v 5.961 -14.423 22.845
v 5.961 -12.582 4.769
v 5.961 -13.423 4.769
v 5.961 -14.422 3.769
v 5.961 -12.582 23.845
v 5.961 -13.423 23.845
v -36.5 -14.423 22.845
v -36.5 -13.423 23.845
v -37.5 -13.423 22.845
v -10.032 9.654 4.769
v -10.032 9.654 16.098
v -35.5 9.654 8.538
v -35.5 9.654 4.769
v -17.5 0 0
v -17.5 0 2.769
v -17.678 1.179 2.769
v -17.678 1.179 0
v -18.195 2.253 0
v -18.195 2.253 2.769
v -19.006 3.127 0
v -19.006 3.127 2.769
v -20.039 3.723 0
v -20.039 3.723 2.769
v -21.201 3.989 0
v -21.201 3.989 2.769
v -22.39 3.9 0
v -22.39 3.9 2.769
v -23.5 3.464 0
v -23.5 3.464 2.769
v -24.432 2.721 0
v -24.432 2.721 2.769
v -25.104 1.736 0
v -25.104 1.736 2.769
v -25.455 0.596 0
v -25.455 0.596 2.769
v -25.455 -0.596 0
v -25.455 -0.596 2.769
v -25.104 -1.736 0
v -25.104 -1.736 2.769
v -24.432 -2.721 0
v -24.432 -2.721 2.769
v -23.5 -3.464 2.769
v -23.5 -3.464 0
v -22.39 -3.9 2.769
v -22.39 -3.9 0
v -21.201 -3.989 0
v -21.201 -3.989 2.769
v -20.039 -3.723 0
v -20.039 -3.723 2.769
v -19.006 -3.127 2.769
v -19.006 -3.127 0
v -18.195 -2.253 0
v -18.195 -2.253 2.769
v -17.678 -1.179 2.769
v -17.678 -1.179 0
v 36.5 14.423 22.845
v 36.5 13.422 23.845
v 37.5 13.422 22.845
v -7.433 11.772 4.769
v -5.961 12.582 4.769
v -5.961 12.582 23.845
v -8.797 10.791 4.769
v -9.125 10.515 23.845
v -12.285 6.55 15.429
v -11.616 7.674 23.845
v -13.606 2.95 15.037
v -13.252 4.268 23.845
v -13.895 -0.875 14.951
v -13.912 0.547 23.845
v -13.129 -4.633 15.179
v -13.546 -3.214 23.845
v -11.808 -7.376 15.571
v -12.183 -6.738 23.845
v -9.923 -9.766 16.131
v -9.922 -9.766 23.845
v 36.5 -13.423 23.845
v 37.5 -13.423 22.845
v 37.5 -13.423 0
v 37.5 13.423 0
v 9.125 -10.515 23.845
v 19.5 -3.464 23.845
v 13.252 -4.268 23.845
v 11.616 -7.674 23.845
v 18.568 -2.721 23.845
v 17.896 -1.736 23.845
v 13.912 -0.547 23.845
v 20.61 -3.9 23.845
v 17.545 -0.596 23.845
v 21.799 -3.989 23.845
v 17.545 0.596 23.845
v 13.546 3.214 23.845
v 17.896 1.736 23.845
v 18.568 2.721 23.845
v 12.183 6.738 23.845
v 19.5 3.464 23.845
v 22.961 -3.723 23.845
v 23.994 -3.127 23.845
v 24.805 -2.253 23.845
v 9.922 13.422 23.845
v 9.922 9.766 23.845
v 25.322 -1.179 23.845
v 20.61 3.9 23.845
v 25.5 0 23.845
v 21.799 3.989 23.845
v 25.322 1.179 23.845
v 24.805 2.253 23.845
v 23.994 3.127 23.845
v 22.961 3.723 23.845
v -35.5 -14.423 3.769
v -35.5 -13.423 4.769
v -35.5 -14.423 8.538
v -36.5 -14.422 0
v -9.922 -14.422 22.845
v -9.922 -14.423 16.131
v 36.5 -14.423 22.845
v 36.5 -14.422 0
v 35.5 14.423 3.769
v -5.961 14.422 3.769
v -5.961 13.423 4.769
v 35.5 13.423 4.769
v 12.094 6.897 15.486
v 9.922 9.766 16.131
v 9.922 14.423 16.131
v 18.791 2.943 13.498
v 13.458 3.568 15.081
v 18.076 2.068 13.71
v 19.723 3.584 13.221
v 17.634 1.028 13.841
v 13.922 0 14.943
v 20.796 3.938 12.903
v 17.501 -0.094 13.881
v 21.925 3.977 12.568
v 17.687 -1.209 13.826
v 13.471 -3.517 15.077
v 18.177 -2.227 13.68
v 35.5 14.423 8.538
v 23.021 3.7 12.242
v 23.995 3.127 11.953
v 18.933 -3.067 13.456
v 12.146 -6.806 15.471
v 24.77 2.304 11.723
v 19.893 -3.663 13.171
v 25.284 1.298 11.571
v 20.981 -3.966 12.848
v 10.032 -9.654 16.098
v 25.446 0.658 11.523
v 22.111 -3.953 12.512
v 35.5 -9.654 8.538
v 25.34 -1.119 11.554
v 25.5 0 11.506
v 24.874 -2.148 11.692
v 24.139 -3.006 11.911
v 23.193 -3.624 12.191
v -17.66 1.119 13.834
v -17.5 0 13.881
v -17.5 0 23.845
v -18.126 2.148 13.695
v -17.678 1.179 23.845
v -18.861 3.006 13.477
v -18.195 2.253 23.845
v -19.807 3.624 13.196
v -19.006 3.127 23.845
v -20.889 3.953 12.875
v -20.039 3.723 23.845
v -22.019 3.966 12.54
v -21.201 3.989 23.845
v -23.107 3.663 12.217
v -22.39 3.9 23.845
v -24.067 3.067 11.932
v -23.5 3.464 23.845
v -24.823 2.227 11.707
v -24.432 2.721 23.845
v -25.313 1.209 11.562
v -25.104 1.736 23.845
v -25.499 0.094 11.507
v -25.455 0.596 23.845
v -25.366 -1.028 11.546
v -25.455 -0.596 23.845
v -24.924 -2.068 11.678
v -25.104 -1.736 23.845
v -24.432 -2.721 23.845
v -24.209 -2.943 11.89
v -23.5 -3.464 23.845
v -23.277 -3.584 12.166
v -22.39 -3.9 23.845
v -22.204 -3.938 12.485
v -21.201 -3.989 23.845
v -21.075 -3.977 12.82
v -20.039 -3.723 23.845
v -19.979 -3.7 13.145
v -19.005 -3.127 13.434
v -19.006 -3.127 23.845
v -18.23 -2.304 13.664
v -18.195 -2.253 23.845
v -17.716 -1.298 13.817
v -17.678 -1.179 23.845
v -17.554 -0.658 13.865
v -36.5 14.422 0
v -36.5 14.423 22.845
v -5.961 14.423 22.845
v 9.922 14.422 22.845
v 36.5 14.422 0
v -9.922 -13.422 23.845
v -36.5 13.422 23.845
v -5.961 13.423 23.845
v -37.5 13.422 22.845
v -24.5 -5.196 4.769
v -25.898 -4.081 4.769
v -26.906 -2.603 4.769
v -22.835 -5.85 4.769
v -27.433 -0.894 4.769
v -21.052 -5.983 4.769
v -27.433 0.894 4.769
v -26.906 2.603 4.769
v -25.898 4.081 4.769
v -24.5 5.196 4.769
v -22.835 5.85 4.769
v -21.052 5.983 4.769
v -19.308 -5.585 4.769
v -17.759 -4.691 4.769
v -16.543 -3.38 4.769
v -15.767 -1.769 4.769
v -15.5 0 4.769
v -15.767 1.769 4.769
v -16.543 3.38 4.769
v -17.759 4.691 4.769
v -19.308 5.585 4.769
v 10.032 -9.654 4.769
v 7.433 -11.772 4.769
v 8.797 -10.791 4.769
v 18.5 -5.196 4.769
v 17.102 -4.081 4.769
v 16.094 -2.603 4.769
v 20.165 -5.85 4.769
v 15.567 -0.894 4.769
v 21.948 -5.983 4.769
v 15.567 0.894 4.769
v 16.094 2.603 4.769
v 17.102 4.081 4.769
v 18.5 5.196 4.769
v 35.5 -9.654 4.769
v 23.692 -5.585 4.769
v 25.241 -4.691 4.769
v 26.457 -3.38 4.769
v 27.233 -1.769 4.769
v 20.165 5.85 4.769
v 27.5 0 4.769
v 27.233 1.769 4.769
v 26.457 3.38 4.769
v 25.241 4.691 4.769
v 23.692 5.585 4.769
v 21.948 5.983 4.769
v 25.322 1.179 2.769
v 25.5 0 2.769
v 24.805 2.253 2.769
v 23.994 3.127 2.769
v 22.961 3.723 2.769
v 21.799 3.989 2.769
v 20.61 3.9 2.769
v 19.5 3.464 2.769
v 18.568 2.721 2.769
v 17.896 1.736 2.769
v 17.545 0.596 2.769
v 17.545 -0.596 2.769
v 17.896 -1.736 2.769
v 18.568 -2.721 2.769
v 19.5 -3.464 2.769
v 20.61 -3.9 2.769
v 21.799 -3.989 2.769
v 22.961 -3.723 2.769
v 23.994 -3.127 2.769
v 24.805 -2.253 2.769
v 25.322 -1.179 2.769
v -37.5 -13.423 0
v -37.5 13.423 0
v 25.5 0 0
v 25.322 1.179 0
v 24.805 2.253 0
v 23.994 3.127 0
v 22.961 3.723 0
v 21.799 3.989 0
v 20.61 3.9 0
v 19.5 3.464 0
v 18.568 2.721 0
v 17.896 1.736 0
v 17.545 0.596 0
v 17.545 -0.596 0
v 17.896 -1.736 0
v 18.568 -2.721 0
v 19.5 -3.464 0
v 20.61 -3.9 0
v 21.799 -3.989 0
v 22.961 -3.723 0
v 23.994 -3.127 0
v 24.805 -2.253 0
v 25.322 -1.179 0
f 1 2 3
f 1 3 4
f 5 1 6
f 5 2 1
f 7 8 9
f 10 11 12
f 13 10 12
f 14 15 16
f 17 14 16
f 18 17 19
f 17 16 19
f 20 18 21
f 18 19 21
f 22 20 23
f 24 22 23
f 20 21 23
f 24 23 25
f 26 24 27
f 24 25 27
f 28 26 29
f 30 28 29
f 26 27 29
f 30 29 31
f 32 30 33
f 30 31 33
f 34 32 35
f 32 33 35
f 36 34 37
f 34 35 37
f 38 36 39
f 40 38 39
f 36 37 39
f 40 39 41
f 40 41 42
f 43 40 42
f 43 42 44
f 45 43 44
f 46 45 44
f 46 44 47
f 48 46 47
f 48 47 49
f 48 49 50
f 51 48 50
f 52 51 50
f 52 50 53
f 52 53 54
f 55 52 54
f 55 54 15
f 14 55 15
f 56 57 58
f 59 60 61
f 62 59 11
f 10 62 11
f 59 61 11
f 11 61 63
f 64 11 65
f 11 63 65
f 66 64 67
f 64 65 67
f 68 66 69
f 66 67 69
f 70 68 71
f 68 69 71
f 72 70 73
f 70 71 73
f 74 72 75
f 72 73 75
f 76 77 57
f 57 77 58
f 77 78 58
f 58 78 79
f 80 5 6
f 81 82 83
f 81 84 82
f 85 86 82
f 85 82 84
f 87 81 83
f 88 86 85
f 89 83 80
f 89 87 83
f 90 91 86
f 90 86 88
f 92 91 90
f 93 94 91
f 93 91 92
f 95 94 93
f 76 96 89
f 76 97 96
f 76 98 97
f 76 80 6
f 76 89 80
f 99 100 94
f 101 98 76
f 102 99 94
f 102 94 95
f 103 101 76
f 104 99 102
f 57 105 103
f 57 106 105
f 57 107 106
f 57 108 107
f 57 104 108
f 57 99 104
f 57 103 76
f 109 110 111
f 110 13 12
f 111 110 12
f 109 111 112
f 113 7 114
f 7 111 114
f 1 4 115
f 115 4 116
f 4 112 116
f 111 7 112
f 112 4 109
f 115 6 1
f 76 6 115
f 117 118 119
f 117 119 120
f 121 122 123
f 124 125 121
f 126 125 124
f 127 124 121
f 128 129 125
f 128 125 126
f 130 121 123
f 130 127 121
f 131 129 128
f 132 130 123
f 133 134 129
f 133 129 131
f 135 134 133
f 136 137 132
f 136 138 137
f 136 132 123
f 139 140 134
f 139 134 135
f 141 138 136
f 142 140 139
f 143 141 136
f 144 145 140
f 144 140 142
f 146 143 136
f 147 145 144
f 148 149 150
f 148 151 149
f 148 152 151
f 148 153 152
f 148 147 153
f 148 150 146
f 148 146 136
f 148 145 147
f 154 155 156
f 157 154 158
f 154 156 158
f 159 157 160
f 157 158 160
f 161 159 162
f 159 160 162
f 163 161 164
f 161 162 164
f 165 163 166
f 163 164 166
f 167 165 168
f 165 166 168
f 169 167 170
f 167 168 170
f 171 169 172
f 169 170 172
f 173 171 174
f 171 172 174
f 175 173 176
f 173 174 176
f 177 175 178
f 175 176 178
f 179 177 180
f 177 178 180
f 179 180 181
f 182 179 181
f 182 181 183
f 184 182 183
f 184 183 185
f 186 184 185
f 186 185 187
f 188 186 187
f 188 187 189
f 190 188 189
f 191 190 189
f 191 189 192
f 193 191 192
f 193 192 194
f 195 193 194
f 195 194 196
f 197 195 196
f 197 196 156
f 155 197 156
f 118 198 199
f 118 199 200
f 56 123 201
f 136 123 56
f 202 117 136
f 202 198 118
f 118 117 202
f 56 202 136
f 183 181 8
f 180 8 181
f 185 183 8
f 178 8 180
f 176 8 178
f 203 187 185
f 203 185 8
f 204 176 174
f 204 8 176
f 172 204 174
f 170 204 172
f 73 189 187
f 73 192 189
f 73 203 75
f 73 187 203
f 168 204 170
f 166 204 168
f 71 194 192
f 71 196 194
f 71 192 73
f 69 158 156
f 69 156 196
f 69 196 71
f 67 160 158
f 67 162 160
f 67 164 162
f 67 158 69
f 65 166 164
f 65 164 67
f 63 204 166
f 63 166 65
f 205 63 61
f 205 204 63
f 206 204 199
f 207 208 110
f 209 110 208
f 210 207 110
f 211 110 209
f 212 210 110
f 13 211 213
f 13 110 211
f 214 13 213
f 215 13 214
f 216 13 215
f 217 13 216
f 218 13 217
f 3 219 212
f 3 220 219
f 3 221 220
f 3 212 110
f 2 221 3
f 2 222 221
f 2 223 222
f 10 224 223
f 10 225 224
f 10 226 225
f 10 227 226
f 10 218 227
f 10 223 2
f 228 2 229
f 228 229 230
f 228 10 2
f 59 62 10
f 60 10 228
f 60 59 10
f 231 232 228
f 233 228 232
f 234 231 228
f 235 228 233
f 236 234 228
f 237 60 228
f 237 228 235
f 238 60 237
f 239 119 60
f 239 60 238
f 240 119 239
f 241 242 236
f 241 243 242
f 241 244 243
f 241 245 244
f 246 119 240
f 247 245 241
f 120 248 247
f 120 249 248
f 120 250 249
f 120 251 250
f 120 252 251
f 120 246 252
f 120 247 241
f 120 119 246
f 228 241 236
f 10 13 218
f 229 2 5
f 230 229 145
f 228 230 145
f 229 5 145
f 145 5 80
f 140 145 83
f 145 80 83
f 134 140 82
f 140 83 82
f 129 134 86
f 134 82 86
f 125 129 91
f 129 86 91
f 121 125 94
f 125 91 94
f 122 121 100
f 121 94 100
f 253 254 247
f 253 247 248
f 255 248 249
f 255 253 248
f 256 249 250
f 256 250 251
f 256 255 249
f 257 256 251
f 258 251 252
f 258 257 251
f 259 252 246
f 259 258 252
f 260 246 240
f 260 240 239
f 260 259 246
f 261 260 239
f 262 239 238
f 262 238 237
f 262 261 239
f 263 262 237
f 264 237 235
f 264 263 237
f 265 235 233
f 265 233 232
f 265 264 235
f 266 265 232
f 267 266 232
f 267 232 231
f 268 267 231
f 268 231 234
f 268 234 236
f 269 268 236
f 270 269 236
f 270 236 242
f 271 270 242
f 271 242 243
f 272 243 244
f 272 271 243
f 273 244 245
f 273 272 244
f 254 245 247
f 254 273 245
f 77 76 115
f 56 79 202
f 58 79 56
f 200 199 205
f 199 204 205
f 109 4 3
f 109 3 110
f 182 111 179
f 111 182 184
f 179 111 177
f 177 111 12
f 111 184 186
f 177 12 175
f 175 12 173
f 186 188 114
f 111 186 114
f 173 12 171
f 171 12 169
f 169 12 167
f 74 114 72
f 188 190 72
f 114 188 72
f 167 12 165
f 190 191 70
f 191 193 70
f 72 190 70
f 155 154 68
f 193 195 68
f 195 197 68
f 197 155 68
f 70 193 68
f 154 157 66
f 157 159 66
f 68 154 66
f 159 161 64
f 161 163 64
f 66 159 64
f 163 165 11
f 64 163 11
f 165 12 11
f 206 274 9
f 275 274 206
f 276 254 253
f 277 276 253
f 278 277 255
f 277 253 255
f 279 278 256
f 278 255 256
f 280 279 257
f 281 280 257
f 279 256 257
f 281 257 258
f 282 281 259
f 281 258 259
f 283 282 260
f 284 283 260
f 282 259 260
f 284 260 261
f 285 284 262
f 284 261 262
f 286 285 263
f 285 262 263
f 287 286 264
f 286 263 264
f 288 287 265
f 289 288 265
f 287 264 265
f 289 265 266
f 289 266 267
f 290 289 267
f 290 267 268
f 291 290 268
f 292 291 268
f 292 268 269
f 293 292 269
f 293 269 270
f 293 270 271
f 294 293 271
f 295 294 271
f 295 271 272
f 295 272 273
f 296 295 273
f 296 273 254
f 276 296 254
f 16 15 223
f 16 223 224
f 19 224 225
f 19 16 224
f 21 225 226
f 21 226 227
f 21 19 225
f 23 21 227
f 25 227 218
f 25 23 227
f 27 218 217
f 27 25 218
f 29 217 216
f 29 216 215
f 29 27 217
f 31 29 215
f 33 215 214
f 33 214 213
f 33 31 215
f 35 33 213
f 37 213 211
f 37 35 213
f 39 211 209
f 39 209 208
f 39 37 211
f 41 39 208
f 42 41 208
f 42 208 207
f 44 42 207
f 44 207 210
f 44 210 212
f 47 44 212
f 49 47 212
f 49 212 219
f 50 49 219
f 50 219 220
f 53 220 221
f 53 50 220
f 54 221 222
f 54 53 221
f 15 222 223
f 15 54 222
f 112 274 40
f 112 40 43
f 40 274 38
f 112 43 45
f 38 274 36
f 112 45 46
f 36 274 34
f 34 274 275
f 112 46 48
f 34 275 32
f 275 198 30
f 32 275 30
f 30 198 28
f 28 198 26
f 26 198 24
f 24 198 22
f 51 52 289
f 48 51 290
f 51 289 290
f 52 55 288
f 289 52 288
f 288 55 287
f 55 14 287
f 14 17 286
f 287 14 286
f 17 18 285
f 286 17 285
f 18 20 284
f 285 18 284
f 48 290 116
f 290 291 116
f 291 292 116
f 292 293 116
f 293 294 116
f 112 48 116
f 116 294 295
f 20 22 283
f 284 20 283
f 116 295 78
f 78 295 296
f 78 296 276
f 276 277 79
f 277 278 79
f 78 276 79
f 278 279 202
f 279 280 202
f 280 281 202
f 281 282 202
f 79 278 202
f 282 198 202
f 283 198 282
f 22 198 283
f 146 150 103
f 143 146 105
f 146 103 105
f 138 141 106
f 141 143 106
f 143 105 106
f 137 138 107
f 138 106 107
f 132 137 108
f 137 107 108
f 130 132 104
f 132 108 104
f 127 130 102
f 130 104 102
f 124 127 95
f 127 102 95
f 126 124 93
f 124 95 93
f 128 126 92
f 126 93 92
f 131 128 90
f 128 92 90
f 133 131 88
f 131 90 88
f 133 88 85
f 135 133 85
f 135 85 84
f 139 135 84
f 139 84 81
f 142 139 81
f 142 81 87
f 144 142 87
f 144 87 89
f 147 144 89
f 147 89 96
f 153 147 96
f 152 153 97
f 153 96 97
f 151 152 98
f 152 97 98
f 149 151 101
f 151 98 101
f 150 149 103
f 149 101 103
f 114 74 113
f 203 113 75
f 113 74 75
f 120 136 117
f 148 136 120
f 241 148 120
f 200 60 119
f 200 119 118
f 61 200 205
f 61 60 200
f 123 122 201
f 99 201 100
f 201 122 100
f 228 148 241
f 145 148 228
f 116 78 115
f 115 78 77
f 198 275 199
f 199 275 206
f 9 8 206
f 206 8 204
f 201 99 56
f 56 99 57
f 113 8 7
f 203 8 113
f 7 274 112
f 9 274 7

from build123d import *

# Parameters (mm, degrees)
SKETCH_W             = 75
SKETCH_H             = 28.845
PAD_DEPTH            = 23.845
POCKET_DEPTH         = 24.076
POCKET001_DEPTH      = 24.076
SKETCH003_R          = 13.9225
POCKET002_DEPTH      = 19.076
SKETCH004_W          = 11.9225
SKETCH004_H          = 19.076
POCKET003_DEPTH      = 14.4235
POCKET003_DEPTH_BACK = -14.4235
SKETCH005_R          = 4
POCKET004_DEPTH      = 23.846
CHAMFER_SIZE         = 2
CHAMFER001_SIZE      = 1
SKETCH006_W          = 4.96125
SKETCH006_H          = 9.73025
POCKET005_DEPTH      = 29.845
SKETCH007_W          = 4.96125
SKETCH007_H          = 9.73025
POCKET006_DEPTH      = 29.845


with BuildPart() as part:
    # Sketch → Pad (new body)
    with BuildSketch(Plane.XY):
        Rectangle(SKETCH_W, SKETCH_H)
    extrude(amount=PAD_DEPTH)

    # Sketch001 → Pocket (cut)
    with BuildSketch(Plane.XZ.offset(-9.6535)):
        Polygon((0, 4.769), (-35.5, 4.769), (-35.5, 8.538), (0, 19.076), align=None)
    extrude(amount=POCKET_DEPTH, mode=Mode.SUBTRACT)

    # Sketch002 → Pocket001 (cut)
    with BuildSketch(Plane.XZ.offset(9.6535)):
        Polygon((0, 4.769), (0, 19.076), (35.5, 8.538), (35.5, 4.769), align=None)
    extrude(amount=-POCKET001_DEPTH, mode=Mode.SUBTRACT)

    # Sketch003 → Pocket002 (cut)
    with BuildSketch(Plane.XY.offset(23.845)):
        Circle(SKETCH003_R)
    extrude(amount=-POCKET002_DEPTH, mode=Mode.SUBTRACT)

    # Sketch004 → Pocket003 (cut, two sides)
    with BuildSketch(Plane.XZ) as pocket003_sk:
        with Locations((0, 14.307)):
            Rectangle(SKETCH004_W, SKETCH004_H)
    extrude(amount=-POCKET003_DEPTH, mode=Mode.SUBTRACT)
    extrude(pocket003_sk.sketch, amount=-POCKET003_DEPTH_BACK, mode=Mode.SUBTRACT)

    # Sketch005 → Pocket004 (cut, through all)
    with BuildSketch(Plane.XY.offset(23.845)):
        with Locations((-21.5, 0)):
            Circle(SKETCH005_R)
        with Locations((21.5, 0)):
            Circle(SKETCH005_R)
    extrude(amount=-POCKET004_DEPTH, mode=Mode.SUBTRACT)

    # Chamfer
    chamfer_edges = [part.edges().sort_by_distance(p)[0] for p in [
        (-25.5, 0, 4.769),
        (17.5, 0, 4.769),
    ]]
    chamfer(chamfer_edges, length=CHAMFER_SIZE)

    # Chamfer001
    chamfer001_edges = [part.edges().sort_by_distance(p)[0] for p in [
        (21.730625, 14.4225, 23.845),
        (-21.730625, 14.4225, 23.845),
        (21.730625, -14.4225, 23.845),
        (-21.730625, -14.4225, 23.845),
        (-37.5, 0, 23.845),
        (37.5, 0, 23.845),
        (20.730625, 14.4225, 4.769),
        (-20.730625, -14.4225, 4.769),
        (-37.5, -14.4225, 11.9225),
        (37.5, 14.4225, 11.9225),
        (37.5, -14.4225, 11.9225),
        (-37.5, 14.4225, 11.9225),
    ]]
    chamfer(chamfer001_edges, length=CHAMFER001_SIZE)

    # Sketch006 → Pocket005 (cut)
    with BuildSketch(Plane.XZ):
        with Locations((-7.441875, 19.979875)):
            Rectangle(SKETCH006_W, SKETCH006_H)
    extrude(amount=POCKET005_DEPTH, mode=Mode.SUBTRACT)

    # Sketch007 → Pocket006 (cut)
    with BuildSketch(Plane.XZ):
        with Locations((7.441875, 19.979875)):
            Rectangle(SKETCH007_W, SKETCH007_H)
    extrude(amount=-POCKET006_DEPTH, mode=Mode.SUBTRACT)


solid = part.part
